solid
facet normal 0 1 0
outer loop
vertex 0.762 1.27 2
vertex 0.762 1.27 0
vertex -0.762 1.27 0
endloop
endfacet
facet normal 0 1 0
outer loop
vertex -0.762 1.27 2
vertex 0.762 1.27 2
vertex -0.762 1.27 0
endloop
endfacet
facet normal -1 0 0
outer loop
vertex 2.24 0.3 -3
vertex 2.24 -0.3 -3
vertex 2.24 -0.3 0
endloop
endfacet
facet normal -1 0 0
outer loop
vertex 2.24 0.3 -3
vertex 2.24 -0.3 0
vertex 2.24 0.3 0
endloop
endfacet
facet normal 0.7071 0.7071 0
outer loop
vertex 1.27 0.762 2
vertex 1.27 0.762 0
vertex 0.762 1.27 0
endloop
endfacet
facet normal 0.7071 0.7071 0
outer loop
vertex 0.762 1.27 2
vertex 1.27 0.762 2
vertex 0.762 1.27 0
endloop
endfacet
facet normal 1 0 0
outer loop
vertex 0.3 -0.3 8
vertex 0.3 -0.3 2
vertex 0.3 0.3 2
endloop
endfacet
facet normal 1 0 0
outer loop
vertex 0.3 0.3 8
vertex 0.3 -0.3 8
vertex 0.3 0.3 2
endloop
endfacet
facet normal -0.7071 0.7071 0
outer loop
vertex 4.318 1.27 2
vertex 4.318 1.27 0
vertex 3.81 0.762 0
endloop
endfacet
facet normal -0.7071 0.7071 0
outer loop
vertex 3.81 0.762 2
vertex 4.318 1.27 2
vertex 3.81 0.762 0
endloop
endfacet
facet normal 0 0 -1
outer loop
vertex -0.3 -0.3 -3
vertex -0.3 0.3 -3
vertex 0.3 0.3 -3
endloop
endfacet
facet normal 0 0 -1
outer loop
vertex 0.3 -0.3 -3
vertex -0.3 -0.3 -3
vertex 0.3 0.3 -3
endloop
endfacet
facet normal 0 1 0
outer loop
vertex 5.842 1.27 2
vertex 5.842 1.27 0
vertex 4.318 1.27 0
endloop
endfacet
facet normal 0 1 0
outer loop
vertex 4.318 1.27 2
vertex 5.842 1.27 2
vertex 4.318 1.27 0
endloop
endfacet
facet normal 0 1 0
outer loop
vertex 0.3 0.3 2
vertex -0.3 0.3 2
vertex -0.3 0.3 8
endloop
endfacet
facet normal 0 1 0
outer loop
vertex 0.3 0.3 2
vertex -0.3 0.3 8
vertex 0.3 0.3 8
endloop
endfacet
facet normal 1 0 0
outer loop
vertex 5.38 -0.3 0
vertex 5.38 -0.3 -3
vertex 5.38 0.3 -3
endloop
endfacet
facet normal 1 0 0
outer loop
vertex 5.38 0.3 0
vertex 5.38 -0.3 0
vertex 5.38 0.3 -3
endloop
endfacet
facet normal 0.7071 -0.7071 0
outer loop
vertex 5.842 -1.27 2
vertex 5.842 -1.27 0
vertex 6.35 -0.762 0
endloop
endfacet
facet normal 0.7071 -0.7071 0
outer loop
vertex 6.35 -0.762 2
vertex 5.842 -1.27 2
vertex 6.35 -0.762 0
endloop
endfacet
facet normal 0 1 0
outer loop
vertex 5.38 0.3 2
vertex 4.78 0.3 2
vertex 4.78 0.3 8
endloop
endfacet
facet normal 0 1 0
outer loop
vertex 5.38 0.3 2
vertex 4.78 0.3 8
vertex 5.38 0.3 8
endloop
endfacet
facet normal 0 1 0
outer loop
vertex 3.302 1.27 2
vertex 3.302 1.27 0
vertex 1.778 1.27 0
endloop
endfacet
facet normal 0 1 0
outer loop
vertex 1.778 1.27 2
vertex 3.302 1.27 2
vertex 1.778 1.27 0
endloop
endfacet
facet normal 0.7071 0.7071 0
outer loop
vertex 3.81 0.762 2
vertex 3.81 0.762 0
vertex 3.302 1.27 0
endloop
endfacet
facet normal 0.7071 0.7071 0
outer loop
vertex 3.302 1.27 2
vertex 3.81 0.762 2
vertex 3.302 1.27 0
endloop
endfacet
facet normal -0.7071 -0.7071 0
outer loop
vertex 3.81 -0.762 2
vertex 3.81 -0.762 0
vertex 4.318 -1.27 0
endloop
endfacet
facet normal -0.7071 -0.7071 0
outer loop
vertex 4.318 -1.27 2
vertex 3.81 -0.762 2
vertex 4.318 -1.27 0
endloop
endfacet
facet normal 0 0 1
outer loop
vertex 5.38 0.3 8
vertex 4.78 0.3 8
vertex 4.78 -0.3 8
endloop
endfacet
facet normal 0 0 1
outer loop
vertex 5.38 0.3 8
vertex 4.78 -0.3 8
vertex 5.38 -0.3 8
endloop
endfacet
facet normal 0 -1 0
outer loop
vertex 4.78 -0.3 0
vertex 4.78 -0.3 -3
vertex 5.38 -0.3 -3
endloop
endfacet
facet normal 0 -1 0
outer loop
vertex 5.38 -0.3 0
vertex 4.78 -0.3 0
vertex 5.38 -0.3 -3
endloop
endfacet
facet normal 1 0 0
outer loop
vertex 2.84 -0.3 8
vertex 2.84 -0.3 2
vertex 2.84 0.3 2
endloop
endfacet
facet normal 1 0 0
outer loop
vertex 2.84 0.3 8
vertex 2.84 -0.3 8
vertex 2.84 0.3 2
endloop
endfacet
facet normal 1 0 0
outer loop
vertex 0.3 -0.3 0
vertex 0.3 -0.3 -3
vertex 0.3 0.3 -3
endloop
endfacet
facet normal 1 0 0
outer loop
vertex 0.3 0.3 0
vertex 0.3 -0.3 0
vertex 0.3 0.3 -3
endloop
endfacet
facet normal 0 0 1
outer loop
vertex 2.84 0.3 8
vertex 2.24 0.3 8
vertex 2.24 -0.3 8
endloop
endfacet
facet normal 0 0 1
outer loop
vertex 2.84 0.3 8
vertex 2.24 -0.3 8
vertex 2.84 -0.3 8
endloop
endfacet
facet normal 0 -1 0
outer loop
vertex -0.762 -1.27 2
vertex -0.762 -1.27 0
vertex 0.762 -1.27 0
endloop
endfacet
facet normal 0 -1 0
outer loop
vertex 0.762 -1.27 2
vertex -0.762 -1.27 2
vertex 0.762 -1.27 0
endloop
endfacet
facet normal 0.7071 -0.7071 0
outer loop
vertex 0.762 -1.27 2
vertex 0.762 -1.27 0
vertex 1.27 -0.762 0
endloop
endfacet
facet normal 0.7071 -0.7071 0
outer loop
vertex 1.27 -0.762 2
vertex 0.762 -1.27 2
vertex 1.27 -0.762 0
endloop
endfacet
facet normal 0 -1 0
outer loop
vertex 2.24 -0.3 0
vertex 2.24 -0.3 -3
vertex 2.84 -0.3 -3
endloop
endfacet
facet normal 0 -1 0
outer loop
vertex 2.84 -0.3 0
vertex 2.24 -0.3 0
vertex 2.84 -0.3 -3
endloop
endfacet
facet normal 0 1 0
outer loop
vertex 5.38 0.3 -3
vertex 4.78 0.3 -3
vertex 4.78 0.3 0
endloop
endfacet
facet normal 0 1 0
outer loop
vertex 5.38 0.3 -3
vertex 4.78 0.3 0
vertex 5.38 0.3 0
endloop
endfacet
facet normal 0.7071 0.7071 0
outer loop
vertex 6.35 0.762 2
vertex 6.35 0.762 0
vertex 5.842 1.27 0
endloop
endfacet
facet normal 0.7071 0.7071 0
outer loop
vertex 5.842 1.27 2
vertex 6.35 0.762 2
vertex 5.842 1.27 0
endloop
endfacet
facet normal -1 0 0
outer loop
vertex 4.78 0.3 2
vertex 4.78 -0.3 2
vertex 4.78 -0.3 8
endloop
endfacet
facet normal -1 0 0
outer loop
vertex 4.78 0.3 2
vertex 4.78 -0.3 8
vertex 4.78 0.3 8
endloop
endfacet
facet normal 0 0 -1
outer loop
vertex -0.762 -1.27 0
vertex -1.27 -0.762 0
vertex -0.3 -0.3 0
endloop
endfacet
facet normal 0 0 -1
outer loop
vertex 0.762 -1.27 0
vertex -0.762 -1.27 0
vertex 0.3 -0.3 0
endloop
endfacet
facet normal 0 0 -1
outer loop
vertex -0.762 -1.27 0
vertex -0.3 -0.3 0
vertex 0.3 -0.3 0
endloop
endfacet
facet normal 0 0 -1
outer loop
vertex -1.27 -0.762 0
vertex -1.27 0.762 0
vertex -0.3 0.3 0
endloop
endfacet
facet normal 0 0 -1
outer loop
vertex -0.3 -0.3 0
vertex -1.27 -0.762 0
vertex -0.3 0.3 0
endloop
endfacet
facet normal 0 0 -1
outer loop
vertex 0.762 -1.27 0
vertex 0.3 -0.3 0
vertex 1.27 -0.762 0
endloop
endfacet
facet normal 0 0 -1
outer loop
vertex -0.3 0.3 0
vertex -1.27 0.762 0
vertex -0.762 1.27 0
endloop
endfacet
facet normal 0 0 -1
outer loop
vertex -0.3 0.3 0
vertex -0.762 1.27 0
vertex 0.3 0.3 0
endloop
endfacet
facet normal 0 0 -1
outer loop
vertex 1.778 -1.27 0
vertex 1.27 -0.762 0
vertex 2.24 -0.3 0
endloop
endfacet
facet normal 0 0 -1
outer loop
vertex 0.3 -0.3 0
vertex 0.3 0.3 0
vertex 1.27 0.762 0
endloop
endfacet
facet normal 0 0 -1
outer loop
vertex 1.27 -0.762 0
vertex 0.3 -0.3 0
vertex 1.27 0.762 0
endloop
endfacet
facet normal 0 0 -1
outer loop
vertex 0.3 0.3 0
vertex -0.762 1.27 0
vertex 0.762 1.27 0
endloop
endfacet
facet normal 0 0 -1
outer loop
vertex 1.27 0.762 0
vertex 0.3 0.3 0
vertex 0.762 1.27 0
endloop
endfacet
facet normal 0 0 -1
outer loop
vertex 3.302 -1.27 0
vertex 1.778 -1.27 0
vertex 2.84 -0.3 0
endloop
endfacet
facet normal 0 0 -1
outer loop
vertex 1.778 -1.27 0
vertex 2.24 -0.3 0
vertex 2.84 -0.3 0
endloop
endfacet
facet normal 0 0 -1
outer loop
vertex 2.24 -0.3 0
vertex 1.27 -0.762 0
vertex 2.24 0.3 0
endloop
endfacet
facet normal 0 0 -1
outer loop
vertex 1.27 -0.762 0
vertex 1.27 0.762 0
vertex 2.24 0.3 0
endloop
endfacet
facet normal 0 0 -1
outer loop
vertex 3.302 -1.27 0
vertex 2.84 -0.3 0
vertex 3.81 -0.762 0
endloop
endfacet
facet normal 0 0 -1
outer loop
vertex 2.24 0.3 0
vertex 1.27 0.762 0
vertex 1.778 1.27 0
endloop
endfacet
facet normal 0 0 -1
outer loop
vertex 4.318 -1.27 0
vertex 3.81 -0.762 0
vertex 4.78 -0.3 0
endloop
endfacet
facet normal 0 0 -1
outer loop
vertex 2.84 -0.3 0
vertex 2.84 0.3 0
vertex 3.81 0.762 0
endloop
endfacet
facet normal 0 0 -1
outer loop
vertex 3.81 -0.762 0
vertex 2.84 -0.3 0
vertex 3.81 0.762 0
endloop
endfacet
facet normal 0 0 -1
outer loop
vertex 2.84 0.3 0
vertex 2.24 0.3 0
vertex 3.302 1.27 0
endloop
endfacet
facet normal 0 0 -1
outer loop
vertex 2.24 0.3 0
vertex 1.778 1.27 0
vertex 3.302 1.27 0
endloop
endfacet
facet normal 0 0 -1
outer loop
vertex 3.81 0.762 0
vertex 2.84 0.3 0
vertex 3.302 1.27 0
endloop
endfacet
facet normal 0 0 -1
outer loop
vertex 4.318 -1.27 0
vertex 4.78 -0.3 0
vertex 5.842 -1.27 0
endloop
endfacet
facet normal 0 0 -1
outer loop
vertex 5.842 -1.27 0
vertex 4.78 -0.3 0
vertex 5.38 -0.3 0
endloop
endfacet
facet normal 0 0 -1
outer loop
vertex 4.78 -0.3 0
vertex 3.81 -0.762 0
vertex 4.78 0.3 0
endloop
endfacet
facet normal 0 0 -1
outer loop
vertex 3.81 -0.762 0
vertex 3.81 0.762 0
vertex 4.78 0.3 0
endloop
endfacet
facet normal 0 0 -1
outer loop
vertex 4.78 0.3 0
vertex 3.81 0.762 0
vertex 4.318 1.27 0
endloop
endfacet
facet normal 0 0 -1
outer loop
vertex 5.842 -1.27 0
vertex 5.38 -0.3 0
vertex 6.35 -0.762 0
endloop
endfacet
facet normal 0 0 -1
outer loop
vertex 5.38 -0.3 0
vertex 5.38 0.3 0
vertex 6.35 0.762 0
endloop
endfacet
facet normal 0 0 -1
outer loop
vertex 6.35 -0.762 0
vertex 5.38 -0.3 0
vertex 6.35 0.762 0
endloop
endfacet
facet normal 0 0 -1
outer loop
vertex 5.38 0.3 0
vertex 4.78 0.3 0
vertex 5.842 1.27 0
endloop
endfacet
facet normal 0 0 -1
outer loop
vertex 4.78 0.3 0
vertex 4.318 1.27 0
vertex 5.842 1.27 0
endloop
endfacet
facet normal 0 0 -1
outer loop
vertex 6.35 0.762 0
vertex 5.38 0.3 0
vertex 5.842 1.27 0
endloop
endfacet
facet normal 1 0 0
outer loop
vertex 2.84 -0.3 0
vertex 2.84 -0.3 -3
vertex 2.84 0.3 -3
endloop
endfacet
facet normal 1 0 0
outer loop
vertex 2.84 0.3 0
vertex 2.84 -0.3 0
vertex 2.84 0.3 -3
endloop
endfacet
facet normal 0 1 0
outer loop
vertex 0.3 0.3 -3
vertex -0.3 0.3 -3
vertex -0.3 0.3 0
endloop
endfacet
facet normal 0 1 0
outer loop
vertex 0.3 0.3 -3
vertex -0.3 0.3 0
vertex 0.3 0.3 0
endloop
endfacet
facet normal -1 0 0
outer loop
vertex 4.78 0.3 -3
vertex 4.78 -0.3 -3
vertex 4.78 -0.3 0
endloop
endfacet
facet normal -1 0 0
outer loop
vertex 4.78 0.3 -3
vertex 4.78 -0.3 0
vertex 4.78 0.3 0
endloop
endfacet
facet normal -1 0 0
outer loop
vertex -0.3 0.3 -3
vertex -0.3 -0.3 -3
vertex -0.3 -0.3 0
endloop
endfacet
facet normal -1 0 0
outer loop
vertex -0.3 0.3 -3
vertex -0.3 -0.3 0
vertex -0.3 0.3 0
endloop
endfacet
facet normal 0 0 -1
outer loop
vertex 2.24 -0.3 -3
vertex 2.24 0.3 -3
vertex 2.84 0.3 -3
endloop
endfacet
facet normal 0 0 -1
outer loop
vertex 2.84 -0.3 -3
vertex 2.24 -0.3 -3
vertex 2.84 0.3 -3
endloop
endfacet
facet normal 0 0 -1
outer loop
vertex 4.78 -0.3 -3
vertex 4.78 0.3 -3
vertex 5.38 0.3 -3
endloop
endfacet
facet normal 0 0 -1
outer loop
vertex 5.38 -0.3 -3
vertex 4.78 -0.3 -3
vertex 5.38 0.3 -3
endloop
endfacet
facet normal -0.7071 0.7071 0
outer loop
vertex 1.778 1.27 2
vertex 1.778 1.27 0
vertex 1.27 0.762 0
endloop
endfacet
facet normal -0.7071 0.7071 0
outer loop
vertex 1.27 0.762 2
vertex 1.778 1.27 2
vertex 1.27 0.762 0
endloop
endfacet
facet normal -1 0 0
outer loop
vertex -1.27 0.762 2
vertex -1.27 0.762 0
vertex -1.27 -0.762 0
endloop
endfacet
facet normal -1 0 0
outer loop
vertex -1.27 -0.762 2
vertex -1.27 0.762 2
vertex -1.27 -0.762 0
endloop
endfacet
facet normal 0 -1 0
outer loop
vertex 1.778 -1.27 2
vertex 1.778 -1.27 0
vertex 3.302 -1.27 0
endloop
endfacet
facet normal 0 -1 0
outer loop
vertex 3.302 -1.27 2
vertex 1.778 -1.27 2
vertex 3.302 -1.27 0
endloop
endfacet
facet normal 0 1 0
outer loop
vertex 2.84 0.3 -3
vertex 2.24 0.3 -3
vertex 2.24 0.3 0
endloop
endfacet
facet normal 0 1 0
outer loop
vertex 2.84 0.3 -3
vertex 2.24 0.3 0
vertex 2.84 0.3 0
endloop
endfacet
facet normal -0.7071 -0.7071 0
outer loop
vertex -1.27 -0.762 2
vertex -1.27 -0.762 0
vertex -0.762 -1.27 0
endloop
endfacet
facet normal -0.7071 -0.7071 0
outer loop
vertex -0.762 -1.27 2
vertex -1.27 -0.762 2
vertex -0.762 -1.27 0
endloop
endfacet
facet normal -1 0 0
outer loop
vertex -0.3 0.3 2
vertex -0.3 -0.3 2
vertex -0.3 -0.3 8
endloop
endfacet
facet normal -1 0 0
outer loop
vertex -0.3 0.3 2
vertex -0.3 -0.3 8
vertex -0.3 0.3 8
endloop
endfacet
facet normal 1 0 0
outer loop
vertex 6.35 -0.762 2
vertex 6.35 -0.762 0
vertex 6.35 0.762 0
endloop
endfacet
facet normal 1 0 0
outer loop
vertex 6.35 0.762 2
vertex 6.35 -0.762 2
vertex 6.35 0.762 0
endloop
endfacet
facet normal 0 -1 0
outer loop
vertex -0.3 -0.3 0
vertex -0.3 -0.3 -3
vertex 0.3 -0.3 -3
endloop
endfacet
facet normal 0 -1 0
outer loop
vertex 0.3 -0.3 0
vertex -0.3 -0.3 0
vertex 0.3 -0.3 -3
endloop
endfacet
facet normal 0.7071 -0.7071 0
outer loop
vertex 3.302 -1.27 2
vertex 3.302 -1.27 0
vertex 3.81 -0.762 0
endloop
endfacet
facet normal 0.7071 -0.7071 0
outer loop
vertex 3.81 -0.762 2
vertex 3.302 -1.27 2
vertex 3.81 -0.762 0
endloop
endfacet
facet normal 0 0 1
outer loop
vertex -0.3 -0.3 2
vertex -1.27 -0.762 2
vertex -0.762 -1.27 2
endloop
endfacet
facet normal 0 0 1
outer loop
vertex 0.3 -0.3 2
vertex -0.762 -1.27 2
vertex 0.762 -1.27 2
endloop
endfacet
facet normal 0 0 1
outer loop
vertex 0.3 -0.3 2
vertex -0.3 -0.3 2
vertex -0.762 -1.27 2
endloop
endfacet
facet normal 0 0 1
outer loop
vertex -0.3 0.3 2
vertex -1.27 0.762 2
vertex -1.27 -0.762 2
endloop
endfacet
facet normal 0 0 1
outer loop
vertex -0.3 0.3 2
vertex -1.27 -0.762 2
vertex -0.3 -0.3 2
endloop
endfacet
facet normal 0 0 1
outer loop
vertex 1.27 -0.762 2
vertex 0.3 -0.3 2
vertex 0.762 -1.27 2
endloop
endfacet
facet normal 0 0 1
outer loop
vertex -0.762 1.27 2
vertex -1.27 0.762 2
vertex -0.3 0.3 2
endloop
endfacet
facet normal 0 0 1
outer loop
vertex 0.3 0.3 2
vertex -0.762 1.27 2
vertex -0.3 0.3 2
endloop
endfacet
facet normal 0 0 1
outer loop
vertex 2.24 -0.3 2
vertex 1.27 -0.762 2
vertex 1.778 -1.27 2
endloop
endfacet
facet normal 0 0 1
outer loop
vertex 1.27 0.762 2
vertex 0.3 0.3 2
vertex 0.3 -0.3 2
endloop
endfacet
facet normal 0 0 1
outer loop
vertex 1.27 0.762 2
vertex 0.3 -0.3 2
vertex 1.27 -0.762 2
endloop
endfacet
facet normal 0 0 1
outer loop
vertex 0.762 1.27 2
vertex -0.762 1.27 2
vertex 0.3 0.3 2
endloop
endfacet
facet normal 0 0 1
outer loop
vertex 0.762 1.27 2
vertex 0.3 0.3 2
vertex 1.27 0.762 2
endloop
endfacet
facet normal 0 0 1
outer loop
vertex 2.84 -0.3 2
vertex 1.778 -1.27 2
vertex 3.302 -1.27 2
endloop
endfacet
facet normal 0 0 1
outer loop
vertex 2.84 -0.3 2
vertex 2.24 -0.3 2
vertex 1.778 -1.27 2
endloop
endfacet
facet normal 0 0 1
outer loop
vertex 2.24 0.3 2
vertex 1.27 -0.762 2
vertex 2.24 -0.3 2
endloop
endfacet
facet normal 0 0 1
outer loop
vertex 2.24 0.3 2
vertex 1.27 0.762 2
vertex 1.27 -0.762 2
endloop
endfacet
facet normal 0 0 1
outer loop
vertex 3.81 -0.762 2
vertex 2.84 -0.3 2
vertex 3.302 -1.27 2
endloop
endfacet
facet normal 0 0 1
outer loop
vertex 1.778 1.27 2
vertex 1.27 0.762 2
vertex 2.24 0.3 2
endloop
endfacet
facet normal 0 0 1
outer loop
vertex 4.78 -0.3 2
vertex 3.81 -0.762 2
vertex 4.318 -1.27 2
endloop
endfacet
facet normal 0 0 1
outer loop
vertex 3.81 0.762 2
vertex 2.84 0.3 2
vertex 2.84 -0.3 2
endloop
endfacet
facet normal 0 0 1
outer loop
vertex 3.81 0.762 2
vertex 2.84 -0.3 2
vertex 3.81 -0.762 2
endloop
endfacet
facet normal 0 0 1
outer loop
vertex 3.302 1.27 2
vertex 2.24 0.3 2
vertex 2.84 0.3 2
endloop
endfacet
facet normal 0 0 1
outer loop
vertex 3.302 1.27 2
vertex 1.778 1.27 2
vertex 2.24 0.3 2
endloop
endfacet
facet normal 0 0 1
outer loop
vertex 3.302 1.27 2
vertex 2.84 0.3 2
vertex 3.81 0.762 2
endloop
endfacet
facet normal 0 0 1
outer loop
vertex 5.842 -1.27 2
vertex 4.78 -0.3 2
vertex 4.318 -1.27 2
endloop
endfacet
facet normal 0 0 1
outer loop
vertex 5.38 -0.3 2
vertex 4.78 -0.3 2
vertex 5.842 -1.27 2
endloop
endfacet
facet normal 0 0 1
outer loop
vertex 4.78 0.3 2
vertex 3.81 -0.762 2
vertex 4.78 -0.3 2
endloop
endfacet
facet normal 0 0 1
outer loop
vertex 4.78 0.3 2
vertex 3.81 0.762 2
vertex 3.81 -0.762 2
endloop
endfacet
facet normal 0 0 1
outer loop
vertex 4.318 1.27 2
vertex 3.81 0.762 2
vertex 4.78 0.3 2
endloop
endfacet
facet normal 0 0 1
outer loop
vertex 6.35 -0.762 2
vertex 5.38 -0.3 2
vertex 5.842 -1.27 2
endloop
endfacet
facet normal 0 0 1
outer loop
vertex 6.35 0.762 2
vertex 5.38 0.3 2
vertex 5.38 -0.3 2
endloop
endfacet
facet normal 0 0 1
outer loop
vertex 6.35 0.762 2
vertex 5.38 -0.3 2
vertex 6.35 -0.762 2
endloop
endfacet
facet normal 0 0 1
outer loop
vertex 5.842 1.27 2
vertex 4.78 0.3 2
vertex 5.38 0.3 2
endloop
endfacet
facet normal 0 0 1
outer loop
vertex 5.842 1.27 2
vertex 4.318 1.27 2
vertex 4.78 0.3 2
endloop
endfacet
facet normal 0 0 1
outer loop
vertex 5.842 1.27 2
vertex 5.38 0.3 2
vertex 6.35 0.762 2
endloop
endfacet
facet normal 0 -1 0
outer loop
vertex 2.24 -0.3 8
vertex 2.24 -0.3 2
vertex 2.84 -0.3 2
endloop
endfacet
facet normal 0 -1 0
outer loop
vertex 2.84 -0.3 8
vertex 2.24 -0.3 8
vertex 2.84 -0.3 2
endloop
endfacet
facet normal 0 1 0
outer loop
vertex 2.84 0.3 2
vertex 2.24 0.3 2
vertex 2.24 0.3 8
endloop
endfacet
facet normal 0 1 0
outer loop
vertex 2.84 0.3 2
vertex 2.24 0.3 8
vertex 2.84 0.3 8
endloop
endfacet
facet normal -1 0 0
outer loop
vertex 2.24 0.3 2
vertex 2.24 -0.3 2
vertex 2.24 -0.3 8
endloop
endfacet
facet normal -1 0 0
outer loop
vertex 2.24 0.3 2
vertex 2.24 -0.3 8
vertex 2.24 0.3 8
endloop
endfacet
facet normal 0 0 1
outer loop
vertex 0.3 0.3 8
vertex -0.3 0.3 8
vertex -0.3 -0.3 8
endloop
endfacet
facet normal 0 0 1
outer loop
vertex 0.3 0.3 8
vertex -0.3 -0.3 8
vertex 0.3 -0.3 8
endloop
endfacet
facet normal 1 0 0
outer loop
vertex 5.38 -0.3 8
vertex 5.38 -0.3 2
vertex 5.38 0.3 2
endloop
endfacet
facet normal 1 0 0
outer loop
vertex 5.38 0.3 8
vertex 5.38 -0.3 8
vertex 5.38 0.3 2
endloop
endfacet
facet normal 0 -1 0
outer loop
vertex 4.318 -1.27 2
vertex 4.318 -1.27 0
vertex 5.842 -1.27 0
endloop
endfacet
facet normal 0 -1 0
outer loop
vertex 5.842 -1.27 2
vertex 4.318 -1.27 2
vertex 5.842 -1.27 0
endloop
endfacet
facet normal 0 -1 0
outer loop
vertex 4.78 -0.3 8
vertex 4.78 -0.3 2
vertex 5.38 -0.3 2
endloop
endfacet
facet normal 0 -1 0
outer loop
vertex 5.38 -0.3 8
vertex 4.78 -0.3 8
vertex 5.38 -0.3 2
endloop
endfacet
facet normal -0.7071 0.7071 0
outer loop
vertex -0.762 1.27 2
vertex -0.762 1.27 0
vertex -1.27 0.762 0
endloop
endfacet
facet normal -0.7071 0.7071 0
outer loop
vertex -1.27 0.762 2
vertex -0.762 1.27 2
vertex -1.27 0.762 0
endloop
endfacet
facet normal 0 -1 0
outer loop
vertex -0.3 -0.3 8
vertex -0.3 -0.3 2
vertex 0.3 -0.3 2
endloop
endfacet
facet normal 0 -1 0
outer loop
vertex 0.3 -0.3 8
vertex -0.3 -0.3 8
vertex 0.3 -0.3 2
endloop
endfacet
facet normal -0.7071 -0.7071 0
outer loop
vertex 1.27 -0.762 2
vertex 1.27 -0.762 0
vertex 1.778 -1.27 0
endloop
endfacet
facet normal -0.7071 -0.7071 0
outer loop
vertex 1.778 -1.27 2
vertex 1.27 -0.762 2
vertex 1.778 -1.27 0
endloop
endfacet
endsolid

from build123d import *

# Parameters (mm, degrees)
SKETCH_1_W           = 0.6
SKETCH_1_H           = 0.6
EXTRUDE_1_DEPTH      = 2
EXTRUDE_2_DEPTH      = 6
EXTRUDE_2_DEPTH_BACK = 5
SKETCH_2_W           = 0.6
SKETCH_2_H           = 0.6


with BuildPart() as part:
    # 草图1 → 凸台-拉伸1 (new body)
    with BuildSketch(Plane.XY):
        Polygon((-0.762, 1.27), (-1.27, 0.762), (-1.27, -0.762), (-0.762, -1.27), (0.762, -1.27), (1.27, -0.762), (1.778, -1.27), (3.302, -1.27), (3.81, -0.762), (4.318, -1.27), (5.842, -1.27), (6.35, -0.762), (6.35, 0.762), (5.842, 1.27), (4.318, 1.27), (3.81, 0.762), (3.302, 1.27), (1.778, 1.27), (1.27, 0.762), (0.762, 1.27), align=None)
        with Locations((2.54, 0)):
            Rectangle(SKETCH_1_W, SKETCH_1_H, mode=Mode.SUBTRACT)
        Rectangle(SKETCH_1_W, SKETCH_1_H, mode=Mode.SUBTRACT)
        with Locations((5.08, 0)):
            Rectangle(SKETCH_1_W, SKETCH_1_H, mode=Mode.SUBTRACT)
    extrude(amount=EXTRUDE_1_DEPTH)

    # 草图2 → 凸台-拉伸2 (add, two sides: drawn at the far end of the back side and taken through both)
    with BuildSketch(Plane.XY.offset(2).offset(-EXTRUDE_2_DEPTH_BACK)):
        Rectangle(SKETCH_2_W, SKETCH_2_H)
        with Locations((2.54, 0)):
            Rectangle(SKETCH_2_W, SKETCH_2_H)
        with Locations((5.08, 0)):
            Rectangle(SKETCH_2_W, SKETCH_2_H)
    extrude(amount=EXTRUDE_2_DEPTH + EXTRUDE_2_DEPTH_BACK)


solid = part.part
